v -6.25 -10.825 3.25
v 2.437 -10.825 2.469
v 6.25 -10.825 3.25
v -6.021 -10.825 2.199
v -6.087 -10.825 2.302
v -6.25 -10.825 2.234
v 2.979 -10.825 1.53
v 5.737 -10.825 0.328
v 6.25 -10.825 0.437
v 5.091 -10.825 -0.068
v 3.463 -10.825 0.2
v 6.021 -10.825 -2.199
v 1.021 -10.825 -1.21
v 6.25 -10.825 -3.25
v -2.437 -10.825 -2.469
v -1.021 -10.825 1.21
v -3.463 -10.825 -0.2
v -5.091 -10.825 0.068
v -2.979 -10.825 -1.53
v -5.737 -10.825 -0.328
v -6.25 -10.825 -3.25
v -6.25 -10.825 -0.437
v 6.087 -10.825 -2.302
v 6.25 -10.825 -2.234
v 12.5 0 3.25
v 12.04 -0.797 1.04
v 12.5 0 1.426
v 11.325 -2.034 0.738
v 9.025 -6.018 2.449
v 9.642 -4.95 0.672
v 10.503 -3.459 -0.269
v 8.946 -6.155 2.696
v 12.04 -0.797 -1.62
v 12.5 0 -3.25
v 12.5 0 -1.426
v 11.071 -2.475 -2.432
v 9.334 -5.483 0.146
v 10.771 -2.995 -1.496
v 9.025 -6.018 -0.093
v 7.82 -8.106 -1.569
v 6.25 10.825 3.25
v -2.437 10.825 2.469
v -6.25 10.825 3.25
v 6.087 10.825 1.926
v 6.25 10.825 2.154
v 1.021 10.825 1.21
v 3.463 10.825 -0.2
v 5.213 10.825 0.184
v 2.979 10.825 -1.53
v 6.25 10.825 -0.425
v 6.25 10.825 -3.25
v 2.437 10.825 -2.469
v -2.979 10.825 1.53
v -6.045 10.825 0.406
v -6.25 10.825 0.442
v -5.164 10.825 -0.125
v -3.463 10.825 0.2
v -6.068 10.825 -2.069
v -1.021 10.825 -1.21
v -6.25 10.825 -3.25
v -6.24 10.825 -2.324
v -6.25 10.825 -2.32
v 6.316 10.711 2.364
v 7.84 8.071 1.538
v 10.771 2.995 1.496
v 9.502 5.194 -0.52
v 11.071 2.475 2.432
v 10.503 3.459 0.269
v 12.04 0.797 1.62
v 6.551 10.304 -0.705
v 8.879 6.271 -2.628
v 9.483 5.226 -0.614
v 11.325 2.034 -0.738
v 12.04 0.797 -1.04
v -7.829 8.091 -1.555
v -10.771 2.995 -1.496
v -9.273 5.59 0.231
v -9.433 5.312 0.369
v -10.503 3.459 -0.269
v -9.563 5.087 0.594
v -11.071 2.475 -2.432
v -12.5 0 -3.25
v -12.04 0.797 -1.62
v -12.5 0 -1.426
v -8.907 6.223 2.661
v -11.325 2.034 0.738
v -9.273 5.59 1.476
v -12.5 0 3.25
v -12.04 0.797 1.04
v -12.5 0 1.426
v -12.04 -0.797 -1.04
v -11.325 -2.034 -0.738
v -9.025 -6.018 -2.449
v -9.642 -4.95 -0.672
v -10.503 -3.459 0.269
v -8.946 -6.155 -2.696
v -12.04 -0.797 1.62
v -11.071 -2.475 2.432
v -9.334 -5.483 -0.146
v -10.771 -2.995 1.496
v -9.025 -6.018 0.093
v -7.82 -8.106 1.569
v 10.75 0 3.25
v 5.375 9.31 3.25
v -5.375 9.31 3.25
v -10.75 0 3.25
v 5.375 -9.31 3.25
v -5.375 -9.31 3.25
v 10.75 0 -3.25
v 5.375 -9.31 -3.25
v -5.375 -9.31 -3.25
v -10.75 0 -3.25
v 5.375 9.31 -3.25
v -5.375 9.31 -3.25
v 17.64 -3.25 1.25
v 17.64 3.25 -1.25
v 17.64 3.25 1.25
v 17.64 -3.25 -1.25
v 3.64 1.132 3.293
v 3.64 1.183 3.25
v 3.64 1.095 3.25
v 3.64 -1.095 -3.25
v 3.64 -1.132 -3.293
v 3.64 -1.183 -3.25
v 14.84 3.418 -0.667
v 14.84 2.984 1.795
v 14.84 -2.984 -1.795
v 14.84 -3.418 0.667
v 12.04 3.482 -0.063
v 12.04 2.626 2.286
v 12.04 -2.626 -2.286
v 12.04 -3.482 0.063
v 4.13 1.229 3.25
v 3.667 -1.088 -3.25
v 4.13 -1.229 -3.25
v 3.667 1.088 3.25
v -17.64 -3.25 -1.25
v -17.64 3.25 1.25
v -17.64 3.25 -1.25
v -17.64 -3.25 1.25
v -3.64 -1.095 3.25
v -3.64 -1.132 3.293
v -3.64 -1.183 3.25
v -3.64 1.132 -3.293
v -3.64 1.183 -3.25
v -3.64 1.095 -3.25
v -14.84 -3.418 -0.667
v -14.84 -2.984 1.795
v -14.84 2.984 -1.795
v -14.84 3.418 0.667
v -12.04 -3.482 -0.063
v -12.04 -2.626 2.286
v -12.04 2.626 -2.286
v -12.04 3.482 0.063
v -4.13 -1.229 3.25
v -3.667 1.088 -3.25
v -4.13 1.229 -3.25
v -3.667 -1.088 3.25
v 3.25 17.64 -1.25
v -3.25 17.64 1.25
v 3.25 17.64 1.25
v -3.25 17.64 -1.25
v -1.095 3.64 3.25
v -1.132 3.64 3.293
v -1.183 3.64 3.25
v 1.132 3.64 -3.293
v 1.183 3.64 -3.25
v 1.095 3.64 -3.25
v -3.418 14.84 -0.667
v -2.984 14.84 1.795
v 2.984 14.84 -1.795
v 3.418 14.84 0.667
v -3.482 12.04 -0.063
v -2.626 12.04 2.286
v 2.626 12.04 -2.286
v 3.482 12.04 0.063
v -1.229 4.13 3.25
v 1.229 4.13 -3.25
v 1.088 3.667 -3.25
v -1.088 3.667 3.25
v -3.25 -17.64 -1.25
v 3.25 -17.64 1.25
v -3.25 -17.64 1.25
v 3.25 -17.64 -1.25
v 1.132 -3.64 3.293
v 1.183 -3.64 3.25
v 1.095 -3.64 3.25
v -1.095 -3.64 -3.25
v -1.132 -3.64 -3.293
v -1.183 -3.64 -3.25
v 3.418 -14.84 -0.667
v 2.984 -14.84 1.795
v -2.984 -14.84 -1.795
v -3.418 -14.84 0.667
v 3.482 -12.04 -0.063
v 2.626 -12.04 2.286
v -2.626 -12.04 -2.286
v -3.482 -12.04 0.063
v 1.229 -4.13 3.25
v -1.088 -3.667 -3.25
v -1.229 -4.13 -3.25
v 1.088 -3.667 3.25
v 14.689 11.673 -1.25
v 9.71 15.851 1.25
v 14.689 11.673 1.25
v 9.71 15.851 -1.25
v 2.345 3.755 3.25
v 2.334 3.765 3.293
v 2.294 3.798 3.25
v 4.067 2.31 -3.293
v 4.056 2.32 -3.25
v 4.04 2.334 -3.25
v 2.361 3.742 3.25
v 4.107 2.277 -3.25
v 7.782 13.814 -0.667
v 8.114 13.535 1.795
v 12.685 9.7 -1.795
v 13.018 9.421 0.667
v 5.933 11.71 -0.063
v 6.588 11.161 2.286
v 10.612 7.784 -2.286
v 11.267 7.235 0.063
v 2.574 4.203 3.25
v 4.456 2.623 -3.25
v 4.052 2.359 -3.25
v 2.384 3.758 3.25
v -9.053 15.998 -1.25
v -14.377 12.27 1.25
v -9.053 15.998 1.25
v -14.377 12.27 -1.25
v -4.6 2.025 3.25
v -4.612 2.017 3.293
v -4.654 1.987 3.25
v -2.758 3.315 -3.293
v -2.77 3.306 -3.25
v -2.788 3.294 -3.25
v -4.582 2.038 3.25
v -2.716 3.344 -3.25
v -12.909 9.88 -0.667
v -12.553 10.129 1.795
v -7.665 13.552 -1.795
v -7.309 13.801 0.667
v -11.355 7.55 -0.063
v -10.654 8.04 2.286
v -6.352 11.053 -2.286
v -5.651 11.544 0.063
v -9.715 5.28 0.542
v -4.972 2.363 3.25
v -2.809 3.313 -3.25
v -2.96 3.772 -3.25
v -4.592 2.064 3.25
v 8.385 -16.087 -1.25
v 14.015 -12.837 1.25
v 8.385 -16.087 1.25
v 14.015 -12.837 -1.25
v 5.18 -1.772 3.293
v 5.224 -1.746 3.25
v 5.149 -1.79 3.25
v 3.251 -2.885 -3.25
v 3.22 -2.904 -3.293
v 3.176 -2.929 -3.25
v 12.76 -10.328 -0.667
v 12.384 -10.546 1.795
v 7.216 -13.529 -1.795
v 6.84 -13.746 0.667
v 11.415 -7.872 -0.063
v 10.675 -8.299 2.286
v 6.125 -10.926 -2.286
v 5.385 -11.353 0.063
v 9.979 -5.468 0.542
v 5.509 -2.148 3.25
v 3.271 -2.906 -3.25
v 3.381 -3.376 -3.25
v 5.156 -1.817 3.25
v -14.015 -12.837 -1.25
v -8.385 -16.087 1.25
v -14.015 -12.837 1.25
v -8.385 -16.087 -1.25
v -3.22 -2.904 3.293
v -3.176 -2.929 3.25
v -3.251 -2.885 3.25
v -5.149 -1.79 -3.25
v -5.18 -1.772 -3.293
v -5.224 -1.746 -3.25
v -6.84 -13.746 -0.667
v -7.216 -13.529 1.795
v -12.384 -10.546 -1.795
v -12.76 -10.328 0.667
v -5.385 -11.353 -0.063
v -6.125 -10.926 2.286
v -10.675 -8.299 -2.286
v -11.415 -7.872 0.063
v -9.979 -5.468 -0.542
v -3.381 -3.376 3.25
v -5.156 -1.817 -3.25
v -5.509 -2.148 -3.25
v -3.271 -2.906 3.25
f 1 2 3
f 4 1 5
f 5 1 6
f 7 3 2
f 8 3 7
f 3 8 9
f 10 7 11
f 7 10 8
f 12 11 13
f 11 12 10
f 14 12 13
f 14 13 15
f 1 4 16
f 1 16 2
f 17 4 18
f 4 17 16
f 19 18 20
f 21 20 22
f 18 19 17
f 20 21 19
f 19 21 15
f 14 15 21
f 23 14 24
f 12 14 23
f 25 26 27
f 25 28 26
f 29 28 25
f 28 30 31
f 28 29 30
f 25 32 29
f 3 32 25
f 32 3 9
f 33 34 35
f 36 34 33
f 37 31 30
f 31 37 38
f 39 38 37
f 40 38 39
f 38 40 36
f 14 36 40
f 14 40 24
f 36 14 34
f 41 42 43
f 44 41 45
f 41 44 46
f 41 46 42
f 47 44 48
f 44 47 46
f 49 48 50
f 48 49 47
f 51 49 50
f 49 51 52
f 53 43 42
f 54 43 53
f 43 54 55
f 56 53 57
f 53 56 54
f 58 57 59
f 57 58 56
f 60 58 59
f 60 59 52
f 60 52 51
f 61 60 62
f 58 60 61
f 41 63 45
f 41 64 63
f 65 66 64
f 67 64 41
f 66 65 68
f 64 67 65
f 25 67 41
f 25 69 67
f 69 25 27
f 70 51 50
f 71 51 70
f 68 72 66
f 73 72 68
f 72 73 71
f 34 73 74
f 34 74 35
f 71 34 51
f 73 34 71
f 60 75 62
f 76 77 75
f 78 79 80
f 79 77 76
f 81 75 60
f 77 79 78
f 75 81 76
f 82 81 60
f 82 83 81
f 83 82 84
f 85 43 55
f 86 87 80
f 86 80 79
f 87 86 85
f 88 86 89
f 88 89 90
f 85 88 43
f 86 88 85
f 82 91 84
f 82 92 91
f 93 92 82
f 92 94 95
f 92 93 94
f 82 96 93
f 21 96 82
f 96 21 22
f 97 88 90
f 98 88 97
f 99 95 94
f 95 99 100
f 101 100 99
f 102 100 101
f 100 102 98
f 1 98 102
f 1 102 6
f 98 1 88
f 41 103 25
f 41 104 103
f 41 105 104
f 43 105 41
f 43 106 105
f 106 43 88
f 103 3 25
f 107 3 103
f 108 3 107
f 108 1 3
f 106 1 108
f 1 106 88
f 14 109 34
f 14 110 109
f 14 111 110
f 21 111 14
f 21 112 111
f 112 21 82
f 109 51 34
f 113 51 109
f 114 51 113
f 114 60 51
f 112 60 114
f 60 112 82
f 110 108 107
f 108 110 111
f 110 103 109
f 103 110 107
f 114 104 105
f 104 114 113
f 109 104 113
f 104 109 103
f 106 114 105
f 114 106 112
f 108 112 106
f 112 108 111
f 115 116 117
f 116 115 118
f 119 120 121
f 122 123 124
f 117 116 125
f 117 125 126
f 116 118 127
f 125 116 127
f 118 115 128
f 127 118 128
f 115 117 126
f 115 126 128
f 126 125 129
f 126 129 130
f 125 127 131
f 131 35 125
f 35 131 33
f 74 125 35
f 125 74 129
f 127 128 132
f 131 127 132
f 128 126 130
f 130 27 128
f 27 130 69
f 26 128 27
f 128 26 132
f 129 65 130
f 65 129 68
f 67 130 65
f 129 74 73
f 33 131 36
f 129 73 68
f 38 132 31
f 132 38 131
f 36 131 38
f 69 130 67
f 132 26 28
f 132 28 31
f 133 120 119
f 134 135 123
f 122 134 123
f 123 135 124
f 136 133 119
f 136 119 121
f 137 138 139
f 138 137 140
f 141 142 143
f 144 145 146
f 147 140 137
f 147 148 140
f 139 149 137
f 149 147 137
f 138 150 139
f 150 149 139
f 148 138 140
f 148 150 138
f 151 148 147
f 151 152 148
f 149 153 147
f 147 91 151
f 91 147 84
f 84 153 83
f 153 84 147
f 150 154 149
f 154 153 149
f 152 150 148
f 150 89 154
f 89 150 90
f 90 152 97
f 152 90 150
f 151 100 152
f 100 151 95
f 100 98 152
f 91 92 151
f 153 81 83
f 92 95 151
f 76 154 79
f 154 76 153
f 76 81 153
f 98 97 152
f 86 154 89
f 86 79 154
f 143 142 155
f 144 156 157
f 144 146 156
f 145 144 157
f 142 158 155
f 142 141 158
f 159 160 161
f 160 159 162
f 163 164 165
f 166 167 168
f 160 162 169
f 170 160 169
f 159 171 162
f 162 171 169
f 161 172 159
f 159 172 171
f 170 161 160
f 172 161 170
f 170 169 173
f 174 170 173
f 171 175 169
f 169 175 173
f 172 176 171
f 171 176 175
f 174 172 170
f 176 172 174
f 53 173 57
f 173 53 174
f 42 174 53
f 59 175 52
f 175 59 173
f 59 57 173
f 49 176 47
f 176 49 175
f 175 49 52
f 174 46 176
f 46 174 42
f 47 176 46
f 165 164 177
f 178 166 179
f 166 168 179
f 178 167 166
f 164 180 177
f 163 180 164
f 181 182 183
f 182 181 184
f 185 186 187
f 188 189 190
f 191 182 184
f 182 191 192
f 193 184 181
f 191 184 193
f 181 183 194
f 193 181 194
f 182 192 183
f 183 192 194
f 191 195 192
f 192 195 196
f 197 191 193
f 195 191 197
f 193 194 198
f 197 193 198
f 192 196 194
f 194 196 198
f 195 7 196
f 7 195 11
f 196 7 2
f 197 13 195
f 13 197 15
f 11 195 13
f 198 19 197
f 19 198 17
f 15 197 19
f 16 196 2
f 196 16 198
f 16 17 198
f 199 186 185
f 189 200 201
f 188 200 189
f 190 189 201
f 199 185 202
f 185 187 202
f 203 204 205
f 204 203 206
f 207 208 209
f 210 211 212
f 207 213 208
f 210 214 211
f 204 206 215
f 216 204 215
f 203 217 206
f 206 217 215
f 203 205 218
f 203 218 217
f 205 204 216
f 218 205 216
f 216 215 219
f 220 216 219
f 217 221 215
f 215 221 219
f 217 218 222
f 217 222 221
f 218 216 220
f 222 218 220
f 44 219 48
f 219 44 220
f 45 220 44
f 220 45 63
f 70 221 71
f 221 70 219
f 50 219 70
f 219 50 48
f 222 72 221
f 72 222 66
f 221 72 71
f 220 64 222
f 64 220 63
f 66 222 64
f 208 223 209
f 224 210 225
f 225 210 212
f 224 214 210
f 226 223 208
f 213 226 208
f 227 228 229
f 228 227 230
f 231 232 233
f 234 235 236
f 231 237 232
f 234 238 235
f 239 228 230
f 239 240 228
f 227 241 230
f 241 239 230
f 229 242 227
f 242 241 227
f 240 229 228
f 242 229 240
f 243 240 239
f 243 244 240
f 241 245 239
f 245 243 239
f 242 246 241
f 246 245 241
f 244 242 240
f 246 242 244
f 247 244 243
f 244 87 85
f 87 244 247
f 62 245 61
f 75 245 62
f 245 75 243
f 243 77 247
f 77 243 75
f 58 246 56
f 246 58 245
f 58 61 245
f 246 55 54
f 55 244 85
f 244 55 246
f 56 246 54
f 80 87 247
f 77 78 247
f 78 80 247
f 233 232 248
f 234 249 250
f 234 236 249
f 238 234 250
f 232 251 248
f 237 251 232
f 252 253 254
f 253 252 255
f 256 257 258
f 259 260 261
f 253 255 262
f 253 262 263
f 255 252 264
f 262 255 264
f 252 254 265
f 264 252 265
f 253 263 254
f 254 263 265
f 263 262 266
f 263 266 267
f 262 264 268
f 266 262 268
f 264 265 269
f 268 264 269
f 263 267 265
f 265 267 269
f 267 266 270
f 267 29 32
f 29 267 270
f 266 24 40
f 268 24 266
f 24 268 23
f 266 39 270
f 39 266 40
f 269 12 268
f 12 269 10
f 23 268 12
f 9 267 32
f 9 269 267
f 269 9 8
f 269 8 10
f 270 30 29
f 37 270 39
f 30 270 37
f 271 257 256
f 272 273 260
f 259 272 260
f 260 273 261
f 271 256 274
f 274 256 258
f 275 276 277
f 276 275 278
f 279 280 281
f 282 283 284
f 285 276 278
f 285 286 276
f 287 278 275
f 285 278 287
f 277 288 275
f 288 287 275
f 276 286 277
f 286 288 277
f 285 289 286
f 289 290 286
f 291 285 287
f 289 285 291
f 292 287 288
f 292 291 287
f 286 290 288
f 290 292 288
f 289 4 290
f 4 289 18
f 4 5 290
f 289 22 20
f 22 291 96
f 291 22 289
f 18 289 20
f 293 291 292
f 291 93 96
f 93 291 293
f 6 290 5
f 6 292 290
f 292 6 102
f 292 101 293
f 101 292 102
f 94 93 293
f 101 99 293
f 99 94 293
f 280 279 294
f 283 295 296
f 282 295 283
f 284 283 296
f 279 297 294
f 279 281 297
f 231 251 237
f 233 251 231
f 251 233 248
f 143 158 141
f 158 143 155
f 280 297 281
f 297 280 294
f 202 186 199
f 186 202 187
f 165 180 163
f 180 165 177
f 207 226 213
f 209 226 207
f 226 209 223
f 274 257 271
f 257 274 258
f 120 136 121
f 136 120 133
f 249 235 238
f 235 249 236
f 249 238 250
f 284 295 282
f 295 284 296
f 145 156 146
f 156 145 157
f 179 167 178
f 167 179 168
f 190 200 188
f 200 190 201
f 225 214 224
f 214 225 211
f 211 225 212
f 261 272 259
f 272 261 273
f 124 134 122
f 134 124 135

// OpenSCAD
spindleD = 25;
spindleH = 6.5;
bladeLength = 14;

module spindle() {
difference() {
    cylinder(d=spindleD, h= spindleH, $fn=6, center=true);
    cylinder(d=spindleD*0.86, h= spindleH*2, $fn=6, center=true);
    }
}

module fanBlade() {
linear_extrude(height = bladeLength, center = true, convexity = 10, twist = 50) square([2.5, spindleH], center=true);
}

module fanBlades() {
union() {
spindle();
translate([bladeLength*0.76,0,0])rotate(a=[0,90,180]) fanBlade();
translate([-bladeLength*0.76,0,0])rotate(a=[0,90,0]) fanBlade();
translate([0,bladeLength*0.76,0])rotate(a=[90,90,0]) fanBlade();
translate([0,-bladeLength*0.76,0])rotate(a=[90,90,180]) fanBlade();
    
// middle blades

translate([bladeLength*0.55,bladeLength*0.6,0])rotate(a=[-50,90,180]) fanBlade();
translate([-bladeLength*0.55,bladeLength*0.6,0])rotate(a=[55,90,0]) fanBlade();
translate([bladeLength*0.55,-bladeLength*0.6,0])rotate(a=[60,90,180]) fanBlade();
translate([-bladeLength*0.55,-bladeLength*0.6,0])rotate(a=[-60,90,0]) fanBlade();
    
/*    
translate([-bladeLength*0.76,0,0])rotate(a=[0,90,0]) fanBlade();
translate([0,bladeLength*0.76,0])rotate(a=[90,90,0]) fanBlade();
translate([0,-bladeLength*0.76,0])rotate(a=[90,90,180]) fanBlade();    
    
    */
    }
}

module fan() {
difference() {
    fanBlades();
    cylinder(d=spindleD*0.86, h= spindleH, $fn=6, center=true);
    }
}

fan();
    
